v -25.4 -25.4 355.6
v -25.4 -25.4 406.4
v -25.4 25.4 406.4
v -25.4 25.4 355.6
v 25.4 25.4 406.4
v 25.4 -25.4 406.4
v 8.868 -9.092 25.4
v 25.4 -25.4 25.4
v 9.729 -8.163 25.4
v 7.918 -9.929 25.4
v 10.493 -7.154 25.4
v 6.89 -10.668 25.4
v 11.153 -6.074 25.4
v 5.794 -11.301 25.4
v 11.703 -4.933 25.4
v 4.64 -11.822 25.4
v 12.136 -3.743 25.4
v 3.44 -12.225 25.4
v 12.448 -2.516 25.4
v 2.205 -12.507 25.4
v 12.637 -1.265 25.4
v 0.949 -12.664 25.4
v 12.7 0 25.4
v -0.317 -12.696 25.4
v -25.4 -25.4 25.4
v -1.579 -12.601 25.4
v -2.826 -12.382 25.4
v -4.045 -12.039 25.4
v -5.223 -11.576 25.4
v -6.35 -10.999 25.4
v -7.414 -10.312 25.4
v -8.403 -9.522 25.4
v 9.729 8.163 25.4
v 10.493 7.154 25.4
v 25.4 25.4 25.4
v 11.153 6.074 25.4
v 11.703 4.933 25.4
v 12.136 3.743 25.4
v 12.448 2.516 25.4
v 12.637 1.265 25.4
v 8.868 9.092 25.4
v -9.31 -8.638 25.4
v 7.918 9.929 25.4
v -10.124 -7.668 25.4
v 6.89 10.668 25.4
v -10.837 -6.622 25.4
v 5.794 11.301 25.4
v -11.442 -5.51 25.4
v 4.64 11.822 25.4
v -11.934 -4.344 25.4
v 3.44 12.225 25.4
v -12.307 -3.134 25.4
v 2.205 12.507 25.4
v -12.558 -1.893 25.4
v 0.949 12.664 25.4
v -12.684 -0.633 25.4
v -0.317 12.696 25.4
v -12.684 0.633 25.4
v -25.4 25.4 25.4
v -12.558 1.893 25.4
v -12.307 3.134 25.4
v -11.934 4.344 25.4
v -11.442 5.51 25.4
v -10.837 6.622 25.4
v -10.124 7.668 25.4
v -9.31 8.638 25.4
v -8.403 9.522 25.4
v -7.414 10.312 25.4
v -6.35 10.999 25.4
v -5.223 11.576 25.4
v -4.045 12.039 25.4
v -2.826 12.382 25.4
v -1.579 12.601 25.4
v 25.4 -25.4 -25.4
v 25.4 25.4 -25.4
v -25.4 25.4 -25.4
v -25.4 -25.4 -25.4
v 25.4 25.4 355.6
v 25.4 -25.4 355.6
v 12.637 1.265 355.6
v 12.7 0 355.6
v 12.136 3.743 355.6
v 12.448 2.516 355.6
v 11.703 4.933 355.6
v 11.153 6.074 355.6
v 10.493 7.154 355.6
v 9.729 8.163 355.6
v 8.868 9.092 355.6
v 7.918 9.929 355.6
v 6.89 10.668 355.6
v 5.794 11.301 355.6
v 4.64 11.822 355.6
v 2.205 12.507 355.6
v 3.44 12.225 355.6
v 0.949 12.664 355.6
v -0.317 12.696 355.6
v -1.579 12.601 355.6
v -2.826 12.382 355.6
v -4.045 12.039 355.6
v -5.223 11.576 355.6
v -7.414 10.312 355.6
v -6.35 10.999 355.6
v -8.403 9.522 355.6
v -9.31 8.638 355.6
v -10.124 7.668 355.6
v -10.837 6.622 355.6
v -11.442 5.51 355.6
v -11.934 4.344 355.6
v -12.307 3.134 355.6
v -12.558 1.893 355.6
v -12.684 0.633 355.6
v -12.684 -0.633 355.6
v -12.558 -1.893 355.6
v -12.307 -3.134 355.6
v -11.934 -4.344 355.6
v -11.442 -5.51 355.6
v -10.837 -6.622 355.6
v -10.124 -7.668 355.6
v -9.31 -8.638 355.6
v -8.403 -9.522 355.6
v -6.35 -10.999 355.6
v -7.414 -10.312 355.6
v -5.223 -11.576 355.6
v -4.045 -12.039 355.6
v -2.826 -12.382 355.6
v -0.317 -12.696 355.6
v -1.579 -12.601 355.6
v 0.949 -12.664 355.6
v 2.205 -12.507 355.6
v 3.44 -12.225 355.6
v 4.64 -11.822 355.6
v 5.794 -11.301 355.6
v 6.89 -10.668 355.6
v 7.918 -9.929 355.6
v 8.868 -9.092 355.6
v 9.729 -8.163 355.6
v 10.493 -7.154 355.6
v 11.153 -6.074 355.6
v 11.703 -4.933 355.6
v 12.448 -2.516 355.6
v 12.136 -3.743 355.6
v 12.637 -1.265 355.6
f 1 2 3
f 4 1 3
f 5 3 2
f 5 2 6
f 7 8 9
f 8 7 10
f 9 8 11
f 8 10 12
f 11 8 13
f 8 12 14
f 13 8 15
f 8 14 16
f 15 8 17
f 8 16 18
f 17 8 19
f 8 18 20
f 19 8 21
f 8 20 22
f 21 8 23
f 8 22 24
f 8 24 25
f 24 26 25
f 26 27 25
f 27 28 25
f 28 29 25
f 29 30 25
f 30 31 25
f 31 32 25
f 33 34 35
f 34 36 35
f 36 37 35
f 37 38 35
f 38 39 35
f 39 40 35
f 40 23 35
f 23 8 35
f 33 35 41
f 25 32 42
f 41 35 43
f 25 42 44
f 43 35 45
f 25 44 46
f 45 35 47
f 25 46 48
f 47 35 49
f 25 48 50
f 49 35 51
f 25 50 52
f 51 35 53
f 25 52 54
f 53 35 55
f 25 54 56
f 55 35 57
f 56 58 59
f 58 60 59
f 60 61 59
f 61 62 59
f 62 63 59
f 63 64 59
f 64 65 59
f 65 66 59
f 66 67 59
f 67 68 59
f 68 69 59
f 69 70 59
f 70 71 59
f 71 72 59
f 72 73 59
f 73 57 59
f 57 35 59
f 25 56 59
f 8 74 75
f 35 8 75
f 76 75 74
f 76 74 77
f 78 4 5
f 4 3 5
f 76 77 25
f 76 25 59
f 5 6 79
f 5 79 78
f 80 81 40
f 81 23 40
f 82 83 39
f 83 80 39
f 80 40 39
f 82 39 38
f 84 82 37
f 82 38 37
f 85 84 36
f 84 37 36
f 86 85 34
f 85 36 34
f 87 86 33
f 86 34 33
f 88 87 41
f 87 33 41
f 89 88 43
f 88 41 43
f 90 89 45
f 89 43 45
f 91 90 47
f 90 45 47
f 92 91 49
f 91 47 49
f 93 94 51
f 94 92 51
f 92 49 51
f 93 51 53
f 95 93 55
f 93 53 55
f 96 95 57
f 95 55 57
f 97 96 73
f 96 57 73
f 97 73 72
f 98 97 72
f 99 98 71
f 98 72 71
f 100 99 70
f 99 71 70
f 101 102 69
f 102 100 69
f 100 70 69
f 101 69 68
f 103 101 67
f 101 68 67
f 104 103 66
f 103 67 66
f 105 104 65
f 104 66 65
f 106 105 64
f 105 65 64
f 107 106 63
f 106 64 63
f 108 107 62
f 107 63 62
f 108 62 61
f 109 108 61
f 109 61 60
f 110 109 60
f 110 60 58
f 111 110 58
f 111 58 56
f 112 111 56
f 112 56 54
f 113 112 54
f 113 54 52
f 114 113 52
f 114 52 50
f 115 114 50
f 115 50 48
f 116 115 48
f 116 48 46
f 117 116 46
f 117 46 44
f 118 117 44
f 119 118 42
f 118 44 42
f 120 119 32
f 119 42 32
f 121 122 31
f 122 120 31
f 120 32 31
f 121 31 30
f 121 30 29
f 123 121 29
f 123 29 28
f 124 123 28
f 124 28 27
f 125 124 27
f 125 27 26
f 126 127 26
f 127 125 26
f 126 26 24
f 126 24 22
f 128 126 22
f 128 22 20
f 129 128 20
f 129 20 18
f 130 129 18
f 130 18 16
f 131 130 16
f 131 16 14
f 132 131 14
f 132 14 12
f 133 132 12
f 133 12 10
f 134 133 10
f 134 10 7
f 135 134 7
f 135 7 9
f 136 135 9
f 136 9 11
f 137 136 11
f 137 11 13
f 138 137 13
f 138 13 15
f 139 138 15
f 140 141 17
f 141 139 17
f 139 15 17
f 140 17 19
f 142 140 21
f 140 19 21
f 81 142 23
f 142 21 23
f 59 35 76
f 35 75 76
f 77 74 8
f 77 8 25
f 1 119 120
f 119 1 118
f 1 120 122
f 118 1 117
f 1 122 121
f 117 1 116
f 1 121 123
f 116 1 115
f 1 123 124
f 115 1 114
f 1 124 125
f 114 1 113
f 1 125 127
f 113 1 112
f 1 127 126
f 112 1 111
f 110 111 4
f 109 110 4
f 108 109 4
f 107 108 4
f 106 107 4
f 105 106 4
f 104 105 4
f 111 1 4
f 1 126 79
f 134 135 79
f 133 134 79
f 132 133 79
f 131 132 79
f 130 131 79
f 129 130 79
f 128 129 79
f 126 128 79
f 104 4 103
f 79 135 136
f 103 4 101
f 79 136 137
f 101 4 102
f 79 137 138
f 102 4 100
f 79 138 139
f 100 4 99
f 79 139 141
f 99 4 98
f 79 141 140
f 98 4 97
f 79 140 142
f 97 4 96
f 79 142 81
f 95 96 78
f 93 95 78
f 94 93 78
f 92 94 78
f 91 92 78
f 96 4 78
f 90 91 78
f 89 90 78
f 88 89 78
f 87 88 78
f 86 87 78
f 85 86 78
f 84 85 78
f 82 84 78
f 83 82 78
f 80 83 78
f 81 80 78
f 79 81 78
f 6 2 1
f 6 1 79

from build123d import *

# Parameters (mm, degrees)
SKETCH3_R           = 12.7
BOSS_EXTRUDE1_DEPTH = 381
SKETCH4_W           = 50.8
SKETCH4_H           = 50.8
BOSS_EXTRUDE2_DEPTH = 25.4
SKETCH5_W           = 50.8
SKETCH5_H           = 50.8
BOSS_EXTRUDE3_DEPTH = 25.4


with BuildPart() as part:
    # Sketch3 → Boss-Extrude1 (new body)
    with BuildSketch(Plane.XY):
        Circle(SKETCH3_R)
    extrude(amount=BOSS_EXTRUDE1_DEPTH)

    # Sketch4 → Boss-Extrude2 (add, symmetric)
    with BuildSketch(Plane(origin=(0, 0, 0), x_dir=(-1, 0, 0), z_dir=(0, 0, -1))):
        Rectangle(SKETCH4_W, SKETCH4_H)
    extrude(amount=BOSS_EXTRUDE2_DEPTH, both=True)

    # Sketch5 → Boss-Extrude3 (add, symmetric)
    with BuildSketch(Plane.XY.offset(381)):
        Rectangle(SKETCH5_W, SKETCH5_H)
    extrude(amount=BOSS_EXTRUDE3_DEPTH, both=True)


solid = part.part
